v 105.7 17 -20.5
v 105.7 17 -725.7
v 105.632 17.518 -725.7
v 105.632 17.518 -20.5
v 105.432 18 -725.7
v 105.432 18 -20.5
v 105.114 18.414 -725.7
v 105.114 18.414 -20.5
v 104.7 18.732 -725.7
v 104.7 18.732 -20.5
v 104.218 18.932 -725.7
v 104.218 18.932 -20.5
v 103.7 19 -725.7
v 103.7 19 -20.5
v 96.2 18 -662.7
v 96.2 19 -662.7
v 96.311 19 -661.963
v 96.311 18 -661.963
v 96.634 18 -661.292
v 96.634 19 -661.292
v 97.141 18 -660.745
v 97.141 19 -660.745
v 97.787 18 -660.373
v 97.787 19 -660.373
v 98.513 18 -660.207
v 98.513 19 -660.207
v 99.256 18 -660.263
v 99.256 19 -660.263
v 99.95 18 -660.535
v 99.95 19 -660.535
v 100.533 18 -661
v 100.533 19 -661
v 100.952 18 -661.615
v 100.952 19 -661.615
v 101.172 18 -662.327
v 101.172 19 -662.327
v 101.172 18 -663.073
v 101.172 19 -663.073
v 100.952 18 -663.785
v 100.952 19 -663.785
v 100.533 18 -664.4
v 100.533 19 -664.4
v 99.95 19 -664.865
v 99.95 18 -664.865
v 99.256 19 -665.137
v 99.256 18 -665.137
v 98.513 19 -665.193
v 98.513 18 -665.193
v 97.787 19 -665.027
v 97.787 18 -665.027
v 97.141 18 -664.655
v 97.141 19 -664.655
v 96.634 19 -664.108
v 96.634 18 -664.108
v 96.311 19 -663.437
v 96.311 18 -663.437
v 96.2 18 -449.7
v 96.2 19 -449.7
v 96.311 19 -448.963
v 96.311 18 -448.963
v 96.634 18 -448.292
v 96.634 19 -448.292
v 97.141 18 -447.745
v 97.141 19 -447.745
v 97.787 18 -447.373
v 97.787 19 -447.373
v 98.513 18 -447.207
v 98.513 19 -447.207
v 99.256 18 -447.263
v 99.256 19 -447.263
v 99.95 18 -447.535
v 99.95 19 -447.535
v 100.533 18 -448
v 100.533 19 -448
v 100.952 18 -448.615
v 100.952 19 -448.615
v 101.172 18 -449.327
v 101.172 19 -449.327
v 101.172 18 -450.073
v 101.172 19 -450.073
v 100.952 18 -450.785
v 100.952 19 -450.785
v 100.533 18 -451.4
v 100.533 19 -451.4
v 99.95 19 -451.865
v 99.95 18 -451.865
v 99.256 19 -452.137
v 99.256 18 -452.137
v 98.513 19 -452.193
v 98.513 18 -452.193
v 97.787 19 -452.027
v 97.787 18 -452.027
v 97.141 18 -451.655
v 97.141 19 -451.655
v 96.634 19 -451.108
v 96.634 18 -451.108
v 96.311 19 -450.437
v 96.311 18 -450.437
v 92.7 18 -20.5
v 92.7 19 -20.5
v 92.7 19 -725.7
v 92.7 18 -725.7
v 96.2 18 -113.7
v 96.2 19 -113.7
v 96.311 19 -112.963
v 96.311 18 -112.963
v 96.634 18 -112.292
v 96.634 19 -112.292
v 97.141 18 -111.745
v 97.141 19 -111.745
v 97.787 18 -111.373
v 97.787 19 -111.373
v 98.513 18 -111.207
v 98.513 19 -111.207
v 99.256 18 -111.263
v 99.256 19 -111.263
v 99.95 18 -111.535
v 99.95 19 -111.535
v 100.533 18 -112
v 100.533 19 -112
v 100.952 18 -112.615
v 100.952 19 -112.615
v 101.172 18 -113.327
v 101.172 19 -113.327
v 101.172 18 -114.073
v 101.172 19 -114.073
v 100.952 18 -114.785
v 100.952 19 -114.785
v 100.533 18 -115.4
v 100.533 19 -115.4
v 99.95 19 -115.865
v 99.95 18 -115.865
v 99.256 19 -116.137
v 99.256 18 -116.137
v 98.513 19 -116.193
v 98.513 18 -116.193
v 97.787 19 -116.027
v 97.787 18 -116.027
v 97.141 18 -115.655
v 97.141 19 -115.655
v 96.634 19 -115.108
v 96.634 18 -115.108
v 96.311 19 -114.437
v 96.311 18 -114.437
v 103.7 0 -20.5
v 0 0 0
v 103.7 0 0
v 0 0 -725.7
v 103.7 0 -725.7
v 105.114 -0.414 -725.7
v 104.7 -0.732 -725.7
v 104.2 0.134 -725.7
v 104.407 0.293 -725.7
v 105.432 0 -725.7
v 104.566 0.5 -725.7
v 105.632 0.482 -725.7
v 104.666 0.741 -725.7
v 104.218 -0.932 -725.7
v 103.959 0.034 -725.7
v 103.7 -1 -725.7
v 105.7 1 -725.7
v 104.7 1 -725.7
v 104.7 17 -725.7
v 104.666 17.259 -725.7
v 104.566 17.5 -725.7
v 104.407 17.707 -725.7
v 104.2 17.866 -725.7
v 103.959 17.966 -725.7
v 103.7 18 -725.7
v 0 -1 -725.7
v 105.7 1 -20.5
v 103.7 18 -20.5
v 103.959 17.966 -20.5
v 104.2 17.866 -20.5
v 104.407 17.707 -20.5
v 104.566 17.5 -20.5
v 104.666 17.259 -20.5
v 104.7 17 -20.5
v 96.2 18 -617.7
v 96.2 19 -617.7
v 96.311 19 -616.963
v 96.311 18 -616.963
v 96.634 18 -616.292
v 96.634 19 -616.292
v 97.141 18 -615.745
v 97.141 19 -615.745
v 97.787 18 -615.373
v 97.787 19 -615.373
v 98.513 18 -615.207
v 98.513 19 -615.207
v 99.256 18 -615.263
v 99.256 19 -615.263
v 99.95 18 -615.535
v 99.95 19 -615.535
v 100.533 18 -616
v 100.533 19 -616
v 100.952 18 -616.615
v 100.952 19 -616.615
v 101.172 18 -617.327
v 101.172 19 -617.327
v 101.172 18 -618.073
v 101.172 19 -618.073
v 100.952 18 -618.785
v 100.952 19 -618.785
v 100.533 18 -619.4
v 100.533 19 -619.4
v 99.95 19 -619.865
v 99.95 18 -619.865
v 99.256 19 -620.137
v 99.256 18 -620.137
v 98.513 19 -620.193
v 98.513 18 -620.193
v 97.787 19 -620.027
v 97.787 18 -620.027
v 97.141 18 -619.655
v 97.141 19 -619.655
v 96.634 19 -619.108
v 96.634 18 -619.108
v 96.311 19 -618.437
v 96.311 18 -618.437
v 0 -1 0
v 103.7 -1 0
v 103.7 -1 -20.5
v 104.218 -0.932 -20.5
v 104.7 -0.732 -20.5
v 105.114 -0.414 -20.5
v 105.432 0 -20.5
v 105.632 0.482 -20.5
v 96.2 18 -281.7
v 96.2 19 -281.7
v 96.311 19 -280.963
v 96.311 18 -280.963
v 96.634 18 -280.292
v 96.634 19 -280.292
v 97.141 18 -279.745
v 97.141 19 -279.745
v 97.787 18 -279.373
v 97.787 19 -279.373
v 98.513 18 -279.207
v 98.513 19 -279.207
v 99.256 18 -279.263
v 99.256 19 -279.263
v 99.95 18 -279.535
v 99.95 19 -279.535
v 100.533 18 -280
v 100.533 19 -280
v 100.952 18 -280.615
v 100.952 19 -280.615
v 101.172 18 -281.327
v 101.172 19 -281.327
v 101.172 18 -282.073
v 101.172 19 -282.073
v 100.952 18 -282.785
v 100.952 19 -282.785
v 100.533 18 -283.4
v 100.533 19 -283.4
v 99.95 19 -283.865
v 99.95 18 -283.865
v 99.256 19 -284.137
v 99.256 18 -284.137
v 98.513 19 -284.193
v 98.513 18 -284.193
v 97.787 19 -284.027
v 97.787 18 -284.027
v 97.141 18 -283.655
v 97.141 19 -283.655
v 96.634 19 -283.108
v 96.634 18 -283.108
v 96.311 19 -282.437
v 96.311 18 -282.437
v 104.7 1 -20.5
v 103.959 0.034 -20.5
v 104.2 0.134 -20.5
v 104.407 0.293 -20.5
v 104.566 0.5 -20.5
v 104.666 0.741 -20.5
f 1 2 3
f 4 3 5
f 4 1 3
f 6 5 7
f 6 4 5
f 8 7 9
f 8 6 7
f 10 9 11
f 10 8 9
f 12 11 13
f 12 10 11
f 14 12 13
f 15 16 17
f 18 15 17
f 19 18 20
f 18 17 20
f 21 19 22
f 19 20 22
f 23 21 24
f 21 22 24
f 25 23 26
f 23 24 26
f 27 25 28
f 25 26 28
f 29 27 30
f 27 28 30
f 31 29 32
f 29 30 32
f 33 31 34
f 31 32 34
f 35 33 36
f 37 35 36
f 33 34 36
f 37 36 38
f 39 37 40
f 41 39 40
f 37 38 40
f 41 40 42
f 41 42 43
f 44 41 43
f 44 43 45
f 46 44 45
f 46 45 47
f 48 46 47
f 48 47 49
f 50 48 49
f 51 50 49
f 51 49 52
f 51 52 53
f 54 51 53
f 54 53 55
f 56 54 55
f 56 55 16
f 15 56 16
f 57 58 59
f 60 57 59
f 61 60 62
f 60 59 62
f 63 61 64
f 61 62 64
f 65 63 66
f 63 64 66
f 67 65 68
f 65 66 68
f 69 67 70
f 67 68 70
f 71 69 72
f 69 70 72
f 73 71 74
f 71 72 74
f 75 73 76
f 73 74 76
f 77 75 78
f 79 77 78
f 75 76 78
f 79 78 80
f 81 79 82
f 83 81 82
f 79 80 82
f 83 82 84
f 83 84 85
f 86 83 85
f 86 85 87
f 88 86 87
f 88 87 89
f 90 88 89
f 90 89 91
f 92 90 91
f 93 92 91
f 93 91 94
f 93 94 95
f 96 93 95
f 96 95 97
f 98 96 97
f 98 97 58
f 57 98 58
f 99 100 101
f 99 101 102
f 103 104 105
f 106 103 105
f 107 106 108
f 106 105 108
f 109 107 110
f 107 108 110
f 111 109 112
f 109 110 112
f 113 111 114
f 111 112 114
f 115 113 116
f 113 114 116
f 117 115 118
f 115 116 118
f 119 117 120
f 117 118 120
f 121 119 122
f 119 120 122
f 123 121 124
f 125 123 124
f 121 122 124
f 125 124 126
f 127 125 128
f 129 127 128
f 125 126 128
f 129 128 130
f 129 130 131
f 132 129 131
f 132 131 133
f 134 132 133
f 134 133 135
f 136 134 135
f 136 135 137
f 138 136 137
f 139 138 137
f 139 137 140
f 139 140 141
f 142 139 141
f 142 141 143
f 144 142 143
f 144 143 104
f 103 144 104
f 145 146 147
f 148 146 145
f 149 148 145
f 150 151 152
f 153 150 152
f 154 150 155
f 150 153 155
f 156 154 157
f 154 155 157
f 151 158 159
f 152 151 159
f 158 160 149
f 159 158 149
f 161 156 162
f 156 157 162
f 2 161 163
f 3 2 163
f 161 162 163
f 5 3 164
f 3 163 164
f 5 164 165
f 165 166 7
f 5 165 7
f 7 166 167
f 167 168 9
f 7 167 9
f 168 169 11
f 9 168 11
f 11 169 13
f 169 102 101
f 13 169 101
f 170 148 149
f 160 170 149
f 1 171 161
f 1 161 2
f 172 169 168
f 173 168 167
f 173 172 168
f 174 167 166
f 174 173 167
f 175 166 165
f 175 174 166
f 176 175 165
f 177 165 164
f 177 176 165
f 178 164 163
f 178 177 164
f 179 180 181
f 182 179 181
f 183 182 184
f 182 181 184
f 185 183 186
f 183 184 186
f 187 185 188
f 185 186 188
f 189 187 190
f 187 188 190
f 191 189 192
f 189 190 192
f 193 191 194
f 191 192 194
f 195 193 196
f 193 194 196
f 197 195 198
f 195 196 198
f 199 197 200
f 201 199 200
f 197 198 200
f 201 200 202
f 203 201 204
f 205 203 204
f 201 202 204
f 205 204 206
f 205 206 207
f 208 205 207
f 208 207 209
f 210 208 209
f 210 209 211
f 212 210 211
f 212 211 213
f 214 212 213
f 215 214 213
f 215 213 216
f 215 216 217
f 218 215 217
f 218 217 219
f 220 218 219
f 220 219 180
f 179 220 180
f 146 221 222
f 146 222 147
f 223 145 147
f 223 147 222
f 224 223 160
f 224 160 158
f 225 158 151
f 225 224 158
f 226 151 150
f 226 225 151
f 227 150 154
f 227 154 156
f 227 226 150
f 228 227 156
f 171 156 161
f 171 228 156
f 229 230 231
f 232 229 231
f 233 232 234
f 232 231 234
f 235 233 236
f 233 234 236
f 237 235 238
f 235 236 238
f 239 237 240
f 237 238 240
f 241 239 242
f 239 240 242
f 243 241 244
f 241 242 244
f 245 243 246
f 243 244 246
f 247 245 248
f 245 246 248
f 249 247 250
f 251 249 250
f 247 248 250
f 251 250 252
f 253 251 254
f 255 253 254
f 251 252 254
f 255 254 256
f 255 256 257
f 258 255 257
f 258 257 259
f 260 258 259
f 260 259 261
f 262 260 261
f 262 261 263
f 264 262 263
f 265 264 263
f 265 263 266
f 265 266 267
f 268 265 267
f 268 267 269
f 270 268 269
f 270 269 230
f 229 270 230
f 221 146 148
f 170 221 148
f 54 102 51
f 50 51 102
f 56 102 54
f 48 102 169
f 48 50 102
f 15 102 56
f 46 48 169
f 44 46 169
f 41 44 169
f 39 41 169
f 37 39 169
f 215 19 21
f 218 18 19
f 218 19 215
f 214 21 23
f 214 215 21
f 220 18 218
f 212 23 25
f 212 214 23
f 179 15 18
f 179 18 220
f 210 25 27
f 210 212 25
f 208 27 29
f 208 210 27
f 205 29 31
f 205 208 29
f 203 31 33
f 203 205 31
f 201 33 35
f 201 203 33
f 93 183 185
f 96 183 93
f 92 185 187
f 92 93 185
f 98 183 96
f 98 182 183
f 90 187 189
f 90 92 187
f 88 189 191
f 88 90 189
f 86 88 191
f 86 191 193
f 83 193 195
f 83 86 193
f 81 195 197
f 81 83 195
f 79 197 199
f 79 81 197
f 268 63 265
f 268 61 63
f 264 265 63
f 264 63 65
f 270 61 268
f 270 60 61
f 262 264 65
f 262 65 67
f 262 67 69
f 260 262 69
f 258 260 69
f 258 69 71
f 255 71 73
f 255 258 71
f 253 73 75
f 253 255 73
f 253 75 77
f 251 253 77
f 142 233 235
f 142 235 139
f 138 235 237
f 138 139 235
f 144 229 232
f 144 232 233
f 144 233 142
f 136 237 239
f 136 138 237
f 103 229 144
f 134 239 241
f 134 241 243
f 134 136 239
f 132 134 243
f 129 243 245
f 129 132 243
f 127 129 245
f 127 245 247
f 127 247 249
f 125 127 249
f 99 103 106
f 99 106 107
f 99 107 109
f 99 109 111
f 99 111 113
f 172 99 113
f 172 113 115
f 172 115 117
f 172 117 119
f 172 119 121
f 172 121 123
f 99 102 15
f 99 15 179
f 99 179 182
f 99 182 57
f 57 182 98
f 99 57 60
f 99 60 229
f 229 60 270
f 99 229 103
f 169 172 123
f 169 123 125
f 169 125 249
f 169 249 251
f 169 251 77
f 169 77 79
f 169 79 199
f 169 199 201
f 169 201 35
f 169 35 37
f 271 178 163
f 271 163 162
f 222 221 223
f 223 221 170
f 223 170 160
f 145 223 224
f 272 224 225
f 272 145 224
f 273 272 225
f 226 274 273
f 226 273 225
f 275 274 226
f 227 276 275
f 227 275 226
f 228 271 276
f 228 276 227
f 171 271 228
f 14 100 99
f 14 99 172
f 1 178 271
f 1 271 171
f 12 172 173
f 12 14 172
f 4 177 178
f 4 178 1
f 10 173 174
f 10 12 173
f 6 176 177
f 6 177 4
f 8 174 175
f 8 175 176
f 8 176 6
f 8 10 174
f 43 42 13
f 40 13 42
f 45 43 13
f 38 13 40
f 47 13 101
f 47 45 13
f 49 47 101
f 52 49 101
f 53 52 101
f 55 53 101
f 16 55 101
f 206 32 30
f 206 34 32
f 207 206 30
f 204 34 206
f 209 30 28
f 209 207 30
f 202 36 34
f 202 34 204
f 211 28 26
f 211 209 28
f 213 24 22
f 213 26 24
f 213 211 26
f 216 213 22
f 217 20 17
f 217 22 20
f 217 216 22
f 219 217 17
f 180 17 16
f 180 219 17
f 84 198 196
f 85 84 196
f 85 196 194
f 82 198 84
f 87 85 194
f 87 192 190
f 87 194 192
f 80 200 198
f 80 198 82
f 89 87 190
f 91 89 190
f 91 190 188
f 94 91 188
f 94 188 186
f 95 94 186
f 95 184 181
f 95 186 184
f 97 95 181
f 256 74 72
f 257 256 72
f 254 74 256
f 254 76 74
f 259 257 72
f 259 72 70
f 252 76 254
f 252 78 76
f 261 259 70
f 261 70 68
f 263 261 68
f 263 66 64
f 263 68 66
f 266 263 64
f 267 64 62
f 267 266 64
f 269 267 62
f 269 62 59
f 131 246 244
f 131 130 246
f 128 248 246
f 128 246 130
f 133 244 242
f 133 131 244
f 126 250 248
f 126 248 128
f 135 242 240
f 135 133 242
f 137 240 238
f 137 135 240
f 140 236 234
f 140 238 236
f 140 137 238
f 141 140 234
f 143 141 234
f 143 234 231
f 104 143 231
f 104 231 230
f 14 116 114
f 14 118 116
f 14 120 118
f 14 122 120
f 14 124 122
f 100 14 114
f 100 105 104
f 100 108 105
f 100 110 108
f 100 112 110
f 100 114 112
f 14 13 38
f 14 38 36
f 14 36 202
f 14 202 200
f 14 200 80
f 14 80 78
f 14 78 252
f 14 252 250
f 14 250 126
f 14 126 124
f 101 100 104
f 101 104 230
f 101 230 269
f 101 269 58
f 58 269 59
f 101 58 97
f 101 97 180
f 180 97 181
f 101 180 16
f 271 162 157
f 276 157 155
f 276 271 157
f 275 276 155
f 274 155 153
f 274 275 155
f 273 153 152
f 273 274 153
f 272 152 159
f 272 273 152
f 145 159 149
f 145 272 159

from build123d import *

# Parameters (mm, degrees)
SKETCH1_W                    = 105.7
SKETCH1_H                    = 725.7
BASE_FLANGE1_DEPTH           = 1
EDGE_FLANGE1_STRIP_W         = 6
EDGE_FLANGE1_STRIP_H         = 1
EDGE_FLANGE1_STRIP_CUT_DEPTH = 725.7
EDGE_FLANGE1_DEPTH           = 725.7
EDGE_FLANGE2_STRIP_W         = 6
EDGE_FLANGE2_STRIP_H         = 1
EDGE_FLANGE2_STRIP_CUT_DEPTH = 725.7
EDGE_FLANGE2_DEPTH           = 725.7
SKETCH19_R                   = 2.5
CUT_EXTRUDE2_DEPTH           = 10
CUT_EXTRUDE3_START           = -20.5
CUT_EXTRUDE3_DEPTH           = 20.5


# Read off the part's stored shape, not the designer's step: Cut-Extrude3
# Sheet-metal steps are written as plain solids
with BuildPart() as part:
    # Sketch1 → Base-Flange1 (new body)
    with BuildSketch(Plane(origin=(0, 0, 0), x_dir=(1, 0, 0), z_dir=(0, 1, 0))):
        with Locations((52.85, 362.85)):
            Rectangle(SKETCH1_W, SKETCH1_H)
    extrude(amount=-BASE_FLANGE1_DEPTH)

    # Edge-Flange1 strip (across the edge) → Edge-Flange1 strip cut (cut)
    with BuildSketch(Plane(origin=(105.7, 0, 0), x_dir=(-1, 0, 0), z_dir=(0, 0, -1))):
        with Locations((-1, -0.5)):
            Rectangle(EDGE_FLANGE1_STRIP_W, EDGE_FLANGE1_STRIP_H)
    extrude(amount=EDGE_FLANGE1_STRIP_CUT_DEPTH, mode=Mode.SUBTRACT)

    # Edge-Flange1 section (across the edge) → Edge-Flange1 (add)
    with BuildSketch(Plane(origin=(105.7, 0, 0), x_dir=(-1, 0, 0), z_dir=(0, 0, -1))):
        with BuildLine():
            Line((0, 1), (0, 19))
            Line((0, 19), (1, 19))
            Line((1, 19), (1, 1))
            ThreePointArc((1, 1), (1.292893219, 0.292893219), (2, 0))
            Line((2, 0), (2, -1))
            ThreePointArc((2, -1), (0.585786438, -0.414213562), (0, 1))
        make_face()
    extrude(amount=EDGE_FLANGE1_DEPTH)

    # Edge-Flange2 strip (across the edge) → Edge-Flange2 strip cut (cut)
    with BuildSketch(Plane(origin=(104.7, 19, 0), x_dir=(0, -1, 0), z_dir=(0, 0, -1))):
        with Locations((-1, -0.5)):
            Rectangle(EDGE_FLANGE2_STRIP_W, EDGE_FLANGE2_STRIP_H)
    extrude(amount=EDGE_FLANGE2_STRIP_CUT_DEPTH, mode=Mode.SUBTRACT)

    # Edge-Flange2 section (across the edge) → Edge-Flange2 (add)
    with BuildSketch(Plane(origin=(104.7, 19, 0), x_dir=(0, -1, 0), z_dir=(0, 0, -1))):
        with BuildLine():
            Line((0, 1), (0, 12))
            Line((0, 12), (1, 12))
            Line((1, 12), (1, 1))
            ThreePointArc((1, 1), (1.292893219, 0.292893219), (2, 0))
            Line((2, 0), (2, -1))
            ThreePointArc((2, -1), (0.585786438, -0.414213562), (0, 1))
        make_face()
    extrude(amount=EDGE_FLANGE2_DEPTH)

    # Sketch19 → Cut-Extrude2 (cut)
    with BuildSketch(Plane(origin=(0, 19, 0), x_dir=(1, 0, 0), z_dir=(0, 1, 0))):
        with Locations(Location((98.7, 662.7, 0), (0, 0, 180))):
            Circle(SKETCH19_R)
        with Locations(Location((98.7, 617.7, 0), (0, 0, 180))):
            Circle(SKETCH19_R)
        with Locations(Location((98.7, 449.7, 0), (0, 0, 180))):
            Circle(SKETCH19_R)
        with Locations(Location((98.7, 281.7, 0), (0, 0, 180))):
            Circle(SKETCH19_R)
        with Locations(Location((98.7, 113.7, 0), (0, 0, 180))):
            Circle(SKETCH19_R)
        with Locations((98.7, -54.3)):
            Circle(SKETCH19_R)
    extrude(amount=-CUT_EXTRUDE2_DEPTH, mode=Mode.SUBTRACT)

    # Cut-Extrude3 outline → Cut-Extrude3 (cut)
    with BuildSketch(Plane.XY.offset(CUT_EXTRUDE3_START)):
        with BuildLine():
            ThreePointArc((104.7, 1), (104.407106781, 0.292893219), (103.7, 0))
            Line((103.7, 0), (103.7, -1))
            ThreePointArc((103.7, -1), (105.114213562, -0.414213562), (105.7, 1))
            Line((105.7, 1), (105.7, 17))
            ThreePointArc((105.7, 17), (105.114213562, 18.414213562), (103.7, 19))
            Line((103.7, 19), (92.7, 19))
            Line((92.7, 19), (92.7, 18))
            Line((92.7, 18), (103.7, 18))
            ThreePointArc((103.7, 18), (104.407106781, 17.707106781), (104.7, 17))
            Line((104.7, 17), (104.7, 1))
        make_face()
    extrude(amount=CUT_EXTRUDE3_DEPTH, mode=Mode.SUBTRACT)


solid = part.part
